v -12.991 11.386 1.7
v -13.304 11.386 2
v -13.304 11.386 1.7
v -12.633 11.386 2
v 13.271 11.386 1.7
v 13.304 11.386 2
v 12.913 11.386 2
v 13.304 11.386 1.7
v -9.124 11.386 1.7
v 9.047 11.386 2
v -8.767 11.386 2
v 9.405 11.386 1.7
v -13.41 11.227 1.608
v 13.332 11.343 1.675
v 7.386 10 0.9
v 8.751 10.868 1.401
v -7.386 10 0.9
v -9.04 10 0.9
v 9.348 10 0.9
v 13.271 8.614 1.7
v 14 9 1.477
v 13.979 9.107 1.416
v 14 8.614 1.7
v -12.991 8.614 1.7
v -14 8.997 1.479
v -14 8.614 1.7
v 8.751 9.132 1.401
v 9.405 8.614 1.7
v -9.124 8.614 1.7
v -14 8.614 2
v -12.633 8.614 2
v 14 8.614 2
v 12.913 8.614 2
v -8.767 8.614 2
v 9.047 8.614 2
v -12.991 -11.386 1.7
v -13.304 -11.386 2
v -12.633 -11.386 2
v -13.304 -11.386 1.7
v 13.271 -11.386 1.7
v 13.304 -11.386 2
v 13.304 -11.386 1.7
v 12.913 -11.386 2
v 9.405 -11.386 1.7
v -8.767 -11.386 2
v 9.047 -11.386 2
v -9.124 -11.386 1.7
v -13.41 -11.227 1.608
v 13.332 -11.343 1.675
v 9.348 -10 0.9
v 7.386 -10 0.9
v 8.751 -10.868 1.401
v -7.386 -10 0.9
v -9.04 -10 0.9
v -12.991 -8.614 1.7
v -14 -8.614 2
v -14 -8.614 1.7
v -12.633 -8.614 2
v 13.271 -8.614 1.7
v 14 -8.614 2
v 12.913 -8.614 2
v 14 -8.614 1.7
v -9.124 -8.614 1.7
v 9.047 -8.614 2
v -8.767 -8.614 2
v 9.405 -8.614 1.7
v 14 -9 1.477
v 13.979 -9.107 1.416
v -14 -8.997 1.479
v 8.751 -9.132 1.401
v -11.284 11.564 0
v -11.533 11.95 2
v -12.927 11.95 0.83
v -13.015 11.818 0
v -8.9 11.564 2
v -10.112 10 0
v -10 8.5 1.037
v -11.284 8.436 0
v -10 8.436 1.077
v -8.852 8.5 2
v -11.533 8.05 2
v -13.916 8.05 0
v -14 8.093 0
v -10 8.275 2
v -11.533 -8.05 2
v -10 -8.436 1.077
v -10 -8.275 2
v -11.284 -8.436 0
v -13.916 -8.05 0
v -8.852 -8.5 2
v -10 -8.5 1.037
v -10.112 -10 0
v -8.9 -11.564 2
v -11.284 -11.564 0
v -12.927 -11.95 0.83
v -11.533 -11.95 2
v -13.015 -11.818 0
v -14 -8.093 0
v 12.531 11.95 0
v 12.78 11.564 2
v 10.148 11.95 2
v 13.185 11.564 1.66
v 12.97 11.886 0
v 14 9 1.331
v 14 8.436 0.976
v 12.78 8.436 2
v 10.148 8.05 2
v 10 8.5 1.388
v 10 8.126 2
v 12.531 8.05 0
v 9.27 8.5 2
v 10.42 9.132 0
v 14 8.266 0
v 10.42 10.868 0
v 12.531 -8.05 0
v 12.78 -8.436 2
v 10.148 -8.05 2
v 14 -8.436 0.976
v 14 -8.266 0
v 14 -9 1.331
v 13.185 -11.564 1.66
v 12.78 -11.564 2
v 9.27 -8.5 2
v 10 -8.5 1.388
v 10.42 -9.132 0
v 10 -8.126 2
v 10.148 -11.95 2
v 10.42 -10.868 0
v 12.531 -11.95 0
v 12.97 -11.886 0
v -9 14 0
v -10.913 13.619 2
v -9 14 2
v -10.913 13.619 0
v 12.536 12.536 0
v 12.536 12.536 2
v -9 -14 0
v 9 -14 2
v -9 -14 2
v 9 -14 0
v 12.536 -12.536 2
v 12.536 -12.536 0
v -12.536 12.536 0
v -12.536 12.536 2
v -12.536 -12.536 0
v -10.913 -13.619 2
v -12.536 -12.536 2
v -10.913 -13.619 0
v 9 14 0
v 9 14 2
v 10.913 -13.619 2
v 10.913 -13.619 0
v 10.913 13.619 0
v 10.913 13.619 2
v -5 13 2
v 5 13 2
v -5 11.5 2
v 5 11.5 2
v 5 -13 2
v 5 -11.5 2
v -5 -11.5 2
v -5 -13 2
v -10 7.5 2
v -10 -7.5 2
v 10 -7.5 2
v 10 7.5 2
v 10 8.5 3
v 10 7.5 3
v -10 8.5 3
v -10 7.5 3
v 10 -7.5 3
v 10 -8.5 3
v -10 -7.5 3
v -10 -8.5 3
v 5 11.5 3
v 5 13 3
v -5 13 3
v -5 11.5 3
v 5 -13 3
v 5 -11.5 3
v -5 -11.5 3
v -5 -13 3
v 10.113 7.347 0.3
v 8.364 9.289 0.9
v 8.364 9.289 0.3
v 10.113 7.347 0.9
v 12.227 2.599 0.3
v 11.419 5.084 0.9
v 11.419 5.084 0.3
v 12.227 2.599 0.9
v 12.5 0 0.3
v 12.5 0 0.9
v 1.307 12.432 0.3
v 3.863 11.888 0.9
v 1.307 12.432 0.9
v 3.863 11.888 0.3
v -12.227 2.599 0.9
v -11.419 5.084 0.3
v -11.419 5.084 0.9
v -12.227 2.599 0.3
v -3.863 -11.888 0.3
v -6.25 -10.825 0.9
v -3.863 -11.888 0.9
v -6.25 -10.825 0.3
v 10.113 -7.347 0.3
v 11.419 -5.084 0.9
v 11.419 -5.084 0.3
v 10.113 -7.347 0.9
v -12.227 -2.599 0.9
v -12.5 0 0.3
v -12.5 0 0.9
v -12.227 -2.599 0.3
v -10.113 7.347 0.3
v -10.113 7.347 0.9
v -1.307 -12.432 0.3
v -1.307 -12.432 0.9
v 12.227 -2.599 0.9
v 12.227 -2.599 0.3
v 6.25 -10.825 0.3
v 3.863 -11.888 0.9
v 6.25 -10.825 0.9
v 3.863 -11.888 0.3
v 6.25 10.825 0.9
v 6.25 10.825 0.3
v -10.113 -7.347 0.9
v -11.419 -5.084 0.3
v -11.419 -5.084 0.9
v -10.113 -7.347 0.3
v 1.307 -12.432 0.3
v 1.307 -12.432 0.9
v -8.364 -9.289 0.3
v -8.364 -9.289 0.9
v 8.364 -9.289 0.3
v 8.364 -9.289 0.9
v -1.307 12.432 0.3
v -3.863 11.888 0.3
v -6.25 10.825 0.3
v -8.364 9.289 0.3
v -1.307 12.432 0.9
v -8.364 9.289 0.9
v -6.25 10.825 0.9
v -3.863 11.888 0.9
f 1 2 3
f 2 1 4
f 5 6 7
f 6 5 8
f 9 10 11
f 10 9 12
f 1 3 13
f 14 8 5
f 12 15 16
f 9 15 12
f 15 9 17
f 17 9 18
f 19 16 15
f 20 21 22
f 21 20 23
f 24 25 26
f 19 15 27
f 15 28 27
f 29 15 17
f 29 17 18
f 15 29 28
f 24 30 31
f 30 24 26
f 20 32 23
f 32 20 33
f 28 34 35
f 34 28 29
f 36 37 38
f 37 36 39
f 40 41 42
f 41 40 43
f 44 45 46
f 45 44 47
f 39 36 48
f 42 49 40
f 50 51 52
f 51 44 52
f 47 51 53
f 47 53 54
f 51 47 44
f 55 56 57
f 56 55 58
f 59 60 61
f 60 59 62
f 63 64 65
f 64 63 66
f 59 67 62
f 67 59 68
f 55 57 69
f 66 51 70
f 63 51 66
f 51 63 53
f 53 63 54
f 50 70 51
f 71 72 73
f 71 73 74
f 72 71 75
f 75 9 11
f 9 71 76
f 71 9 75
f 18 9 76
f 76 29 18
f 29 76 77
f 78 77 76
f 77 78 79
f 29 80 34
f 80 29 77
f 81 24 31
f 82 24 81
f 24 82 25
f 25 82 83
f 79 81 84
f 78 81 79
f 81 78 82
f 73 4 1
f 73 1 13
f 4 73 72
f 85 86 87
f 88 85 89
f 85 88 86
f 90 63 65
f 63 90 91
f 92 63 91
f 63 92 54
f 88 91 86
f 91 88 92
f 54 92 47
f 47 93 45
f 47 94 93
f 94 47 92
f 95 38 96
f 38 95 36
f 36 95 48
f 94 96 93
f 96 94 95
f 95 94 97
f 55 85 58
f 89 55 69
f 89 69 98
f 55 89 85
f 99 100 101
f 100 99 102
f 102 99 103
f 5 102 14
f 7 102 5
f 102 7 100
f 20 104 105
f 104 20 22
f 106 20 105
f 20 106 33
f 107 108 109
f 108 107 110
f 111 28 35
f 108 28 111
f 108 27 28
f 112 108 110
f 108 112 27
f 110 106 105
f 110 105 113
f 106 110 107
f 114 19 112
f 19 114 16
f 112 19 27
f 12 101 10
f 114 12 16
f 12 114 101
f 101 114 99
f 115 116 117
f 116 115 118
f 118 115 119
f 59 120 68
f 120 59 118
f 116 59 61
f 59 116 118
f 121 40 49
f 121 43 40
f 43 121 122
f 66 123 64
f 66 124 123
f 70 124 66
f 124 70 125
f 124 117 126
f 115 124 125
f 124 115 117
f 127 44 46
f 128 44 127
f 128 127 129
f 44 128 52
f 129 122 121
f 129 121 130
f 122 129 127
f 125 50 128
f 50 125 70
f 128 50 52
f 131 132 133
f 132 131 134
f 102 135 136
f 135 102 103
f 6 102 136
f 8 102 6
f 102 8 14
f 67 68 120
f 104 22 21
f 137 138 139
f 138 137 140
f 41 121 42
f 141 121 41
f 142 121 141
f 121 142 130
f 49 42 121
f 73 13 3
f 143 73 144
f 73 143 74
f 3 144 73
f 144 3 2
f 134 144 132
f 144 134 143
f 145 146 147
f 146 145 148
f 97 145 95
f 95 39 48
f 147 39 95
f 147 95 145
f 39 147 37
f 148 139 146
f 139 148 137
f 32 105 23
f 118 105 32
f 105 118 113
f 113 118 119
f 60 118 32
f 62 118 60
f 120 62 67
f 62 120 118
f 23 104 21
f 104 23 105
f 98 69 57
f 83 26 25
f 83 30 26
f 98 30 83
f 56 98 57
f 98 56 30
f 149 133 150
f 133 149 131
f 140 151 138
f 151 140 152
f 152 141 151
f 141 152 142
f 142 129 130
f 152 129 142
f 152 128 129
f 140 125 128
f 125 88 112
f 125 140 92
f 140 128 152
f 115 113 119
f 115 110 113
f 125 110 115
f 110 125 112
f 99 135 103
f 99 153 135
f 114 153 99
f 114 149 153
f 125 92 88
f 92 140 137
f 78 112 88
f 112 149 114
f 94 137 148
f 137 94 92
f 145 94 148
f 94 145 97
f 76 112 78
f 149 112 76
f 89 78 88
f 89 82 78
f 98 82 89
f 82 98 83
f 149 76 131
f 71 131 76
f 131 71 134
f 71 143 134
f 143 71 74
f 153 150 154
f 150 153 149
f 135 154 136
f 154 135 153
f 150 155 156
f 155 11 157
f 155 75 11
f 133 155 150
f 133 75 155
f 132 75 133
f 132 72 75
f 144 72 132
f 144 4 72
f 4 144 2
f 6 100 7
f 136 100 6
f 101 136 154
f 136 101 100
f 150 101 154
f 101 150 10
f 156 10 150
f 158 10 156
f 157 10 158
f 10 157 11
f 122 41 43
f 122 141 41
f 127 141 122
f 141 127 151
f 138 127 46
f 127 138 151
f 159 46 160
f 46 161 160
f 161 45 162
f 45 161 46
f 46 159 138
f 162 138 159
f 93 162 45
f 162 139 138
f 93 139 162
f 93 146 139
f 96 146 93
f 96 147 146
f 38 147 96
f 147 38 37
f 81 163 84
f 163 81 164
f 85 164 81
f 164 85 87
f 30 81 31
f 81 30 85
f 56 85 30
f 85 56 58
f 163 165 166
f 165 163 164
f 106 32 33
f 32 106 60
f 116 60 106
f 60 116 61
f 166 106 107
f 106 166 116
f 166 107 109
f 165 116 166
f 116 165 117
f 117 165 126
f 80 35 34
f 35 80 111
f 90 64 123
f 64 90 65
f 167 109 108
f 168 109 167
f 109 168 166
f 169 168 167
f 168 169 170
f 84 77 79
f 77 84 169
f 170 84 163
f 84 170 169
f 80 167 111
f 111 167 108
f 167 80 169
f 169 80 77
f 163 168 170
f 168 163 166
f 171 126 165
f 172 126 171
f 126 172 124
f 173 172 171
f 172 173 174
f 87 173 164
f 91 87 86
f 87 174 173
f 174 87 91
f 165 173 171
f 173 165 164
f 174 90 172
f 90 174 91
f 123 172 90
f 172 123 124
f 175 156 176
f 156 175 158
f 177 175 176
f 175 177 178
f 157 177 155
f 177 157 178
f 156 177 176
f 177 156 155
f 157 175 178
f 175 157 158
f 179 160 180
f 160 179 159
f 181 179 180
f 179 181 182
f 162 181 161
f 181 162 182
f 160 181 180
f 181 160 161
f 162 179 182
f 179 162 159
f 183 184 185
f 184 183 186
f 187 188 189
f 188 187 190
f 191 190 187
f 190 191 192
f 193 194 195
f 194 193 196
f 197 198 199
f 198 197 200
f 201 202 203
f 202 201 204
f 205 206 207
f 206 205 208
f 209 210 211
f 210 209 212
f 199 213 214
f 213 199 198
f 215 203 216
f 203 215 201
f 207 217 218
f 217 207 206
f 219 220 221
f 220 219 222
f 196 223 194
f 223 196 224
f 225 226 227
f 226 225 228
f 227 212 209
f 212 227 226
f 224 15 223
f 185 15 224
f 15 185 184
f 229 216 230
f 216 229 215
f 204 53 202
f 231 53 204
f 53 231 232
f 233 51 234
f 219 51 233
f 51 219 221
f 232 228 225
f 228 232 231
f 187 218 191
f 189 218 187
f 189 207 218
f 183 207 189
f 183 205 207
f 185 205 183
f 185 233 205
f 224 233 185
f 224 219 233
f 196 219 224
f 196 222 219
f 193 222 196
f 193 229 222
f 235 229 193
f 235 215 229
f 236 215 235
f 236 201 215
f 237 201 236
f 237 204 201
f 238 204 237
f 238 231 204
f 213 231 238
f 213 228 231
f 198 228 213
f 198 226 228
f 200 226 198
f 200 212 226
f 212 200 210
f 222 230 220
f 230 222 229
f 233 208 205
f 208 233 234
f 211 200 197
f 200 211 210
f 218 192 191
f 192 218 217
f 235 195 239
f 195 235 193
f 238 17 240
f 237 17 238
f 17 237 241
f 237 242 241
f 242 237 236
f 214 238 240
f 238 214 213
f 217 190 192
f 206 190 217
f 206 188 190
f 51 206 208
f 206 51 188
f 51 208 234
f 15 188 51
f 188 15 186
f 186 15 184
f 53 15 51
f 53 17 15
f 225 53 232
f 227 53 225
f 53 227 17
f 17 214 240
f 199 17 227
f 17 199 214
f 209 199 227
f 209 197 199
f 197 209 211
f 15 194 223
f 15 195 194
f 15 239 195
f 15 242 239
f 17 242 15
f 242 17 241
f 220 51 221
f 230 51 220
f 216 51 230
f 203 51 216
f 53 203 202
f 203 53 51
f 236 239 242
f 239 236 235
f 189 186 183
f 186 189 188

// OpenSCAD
module nfc(){
	color("green")
	linear_extrude(height=0.6)
	circle(r=25/2);
}

module plate(){
	difference(){
	color("red")
	linear_extrude(height=2.0){
		minkowski(){
			circle(r=5);
			square(18, center=true);
		}
	}
	rotate([0,90,0]){
		translate([-2.5,10,0])
		cylinder(h=30,r=1.6,center=true);
		translate([-2.5,-10,0])
		cylinder(h=30,r=1.6,center=true);
	}
	rotate([0,50,0]){
		translate([-8.5,10,0])
		cylinder(h=30,r=2,center=true);
		translate([-8.5,-10,0])
		cylinder(h=30,r=2,center=true);
	}
	rotate([0,-50,0]){
		translate([8.5,10,0])
		cylinder(h=30,r=2,center=true);
		translate([8.5,-10,0])
		cylinder(h=30,r=2,center=true);
	}
}
translate([-20/2,7.5,0]){
	cube([20,1,3]);
}
translate([-20/2,-8.5,0]){
	cube([20,1,3]);
}

translate([-10/2,11.5,0]){
	cube([10,1.5,3]);
}
translate([-10/2,-13,0]){
	cube([10,1.5,3]);
}
translate([-20/2,-8.5,0]){
	cube([20,1,3]);
}
}
difference(){
plate();
translate([0,0,0.3])
nfc();
}
